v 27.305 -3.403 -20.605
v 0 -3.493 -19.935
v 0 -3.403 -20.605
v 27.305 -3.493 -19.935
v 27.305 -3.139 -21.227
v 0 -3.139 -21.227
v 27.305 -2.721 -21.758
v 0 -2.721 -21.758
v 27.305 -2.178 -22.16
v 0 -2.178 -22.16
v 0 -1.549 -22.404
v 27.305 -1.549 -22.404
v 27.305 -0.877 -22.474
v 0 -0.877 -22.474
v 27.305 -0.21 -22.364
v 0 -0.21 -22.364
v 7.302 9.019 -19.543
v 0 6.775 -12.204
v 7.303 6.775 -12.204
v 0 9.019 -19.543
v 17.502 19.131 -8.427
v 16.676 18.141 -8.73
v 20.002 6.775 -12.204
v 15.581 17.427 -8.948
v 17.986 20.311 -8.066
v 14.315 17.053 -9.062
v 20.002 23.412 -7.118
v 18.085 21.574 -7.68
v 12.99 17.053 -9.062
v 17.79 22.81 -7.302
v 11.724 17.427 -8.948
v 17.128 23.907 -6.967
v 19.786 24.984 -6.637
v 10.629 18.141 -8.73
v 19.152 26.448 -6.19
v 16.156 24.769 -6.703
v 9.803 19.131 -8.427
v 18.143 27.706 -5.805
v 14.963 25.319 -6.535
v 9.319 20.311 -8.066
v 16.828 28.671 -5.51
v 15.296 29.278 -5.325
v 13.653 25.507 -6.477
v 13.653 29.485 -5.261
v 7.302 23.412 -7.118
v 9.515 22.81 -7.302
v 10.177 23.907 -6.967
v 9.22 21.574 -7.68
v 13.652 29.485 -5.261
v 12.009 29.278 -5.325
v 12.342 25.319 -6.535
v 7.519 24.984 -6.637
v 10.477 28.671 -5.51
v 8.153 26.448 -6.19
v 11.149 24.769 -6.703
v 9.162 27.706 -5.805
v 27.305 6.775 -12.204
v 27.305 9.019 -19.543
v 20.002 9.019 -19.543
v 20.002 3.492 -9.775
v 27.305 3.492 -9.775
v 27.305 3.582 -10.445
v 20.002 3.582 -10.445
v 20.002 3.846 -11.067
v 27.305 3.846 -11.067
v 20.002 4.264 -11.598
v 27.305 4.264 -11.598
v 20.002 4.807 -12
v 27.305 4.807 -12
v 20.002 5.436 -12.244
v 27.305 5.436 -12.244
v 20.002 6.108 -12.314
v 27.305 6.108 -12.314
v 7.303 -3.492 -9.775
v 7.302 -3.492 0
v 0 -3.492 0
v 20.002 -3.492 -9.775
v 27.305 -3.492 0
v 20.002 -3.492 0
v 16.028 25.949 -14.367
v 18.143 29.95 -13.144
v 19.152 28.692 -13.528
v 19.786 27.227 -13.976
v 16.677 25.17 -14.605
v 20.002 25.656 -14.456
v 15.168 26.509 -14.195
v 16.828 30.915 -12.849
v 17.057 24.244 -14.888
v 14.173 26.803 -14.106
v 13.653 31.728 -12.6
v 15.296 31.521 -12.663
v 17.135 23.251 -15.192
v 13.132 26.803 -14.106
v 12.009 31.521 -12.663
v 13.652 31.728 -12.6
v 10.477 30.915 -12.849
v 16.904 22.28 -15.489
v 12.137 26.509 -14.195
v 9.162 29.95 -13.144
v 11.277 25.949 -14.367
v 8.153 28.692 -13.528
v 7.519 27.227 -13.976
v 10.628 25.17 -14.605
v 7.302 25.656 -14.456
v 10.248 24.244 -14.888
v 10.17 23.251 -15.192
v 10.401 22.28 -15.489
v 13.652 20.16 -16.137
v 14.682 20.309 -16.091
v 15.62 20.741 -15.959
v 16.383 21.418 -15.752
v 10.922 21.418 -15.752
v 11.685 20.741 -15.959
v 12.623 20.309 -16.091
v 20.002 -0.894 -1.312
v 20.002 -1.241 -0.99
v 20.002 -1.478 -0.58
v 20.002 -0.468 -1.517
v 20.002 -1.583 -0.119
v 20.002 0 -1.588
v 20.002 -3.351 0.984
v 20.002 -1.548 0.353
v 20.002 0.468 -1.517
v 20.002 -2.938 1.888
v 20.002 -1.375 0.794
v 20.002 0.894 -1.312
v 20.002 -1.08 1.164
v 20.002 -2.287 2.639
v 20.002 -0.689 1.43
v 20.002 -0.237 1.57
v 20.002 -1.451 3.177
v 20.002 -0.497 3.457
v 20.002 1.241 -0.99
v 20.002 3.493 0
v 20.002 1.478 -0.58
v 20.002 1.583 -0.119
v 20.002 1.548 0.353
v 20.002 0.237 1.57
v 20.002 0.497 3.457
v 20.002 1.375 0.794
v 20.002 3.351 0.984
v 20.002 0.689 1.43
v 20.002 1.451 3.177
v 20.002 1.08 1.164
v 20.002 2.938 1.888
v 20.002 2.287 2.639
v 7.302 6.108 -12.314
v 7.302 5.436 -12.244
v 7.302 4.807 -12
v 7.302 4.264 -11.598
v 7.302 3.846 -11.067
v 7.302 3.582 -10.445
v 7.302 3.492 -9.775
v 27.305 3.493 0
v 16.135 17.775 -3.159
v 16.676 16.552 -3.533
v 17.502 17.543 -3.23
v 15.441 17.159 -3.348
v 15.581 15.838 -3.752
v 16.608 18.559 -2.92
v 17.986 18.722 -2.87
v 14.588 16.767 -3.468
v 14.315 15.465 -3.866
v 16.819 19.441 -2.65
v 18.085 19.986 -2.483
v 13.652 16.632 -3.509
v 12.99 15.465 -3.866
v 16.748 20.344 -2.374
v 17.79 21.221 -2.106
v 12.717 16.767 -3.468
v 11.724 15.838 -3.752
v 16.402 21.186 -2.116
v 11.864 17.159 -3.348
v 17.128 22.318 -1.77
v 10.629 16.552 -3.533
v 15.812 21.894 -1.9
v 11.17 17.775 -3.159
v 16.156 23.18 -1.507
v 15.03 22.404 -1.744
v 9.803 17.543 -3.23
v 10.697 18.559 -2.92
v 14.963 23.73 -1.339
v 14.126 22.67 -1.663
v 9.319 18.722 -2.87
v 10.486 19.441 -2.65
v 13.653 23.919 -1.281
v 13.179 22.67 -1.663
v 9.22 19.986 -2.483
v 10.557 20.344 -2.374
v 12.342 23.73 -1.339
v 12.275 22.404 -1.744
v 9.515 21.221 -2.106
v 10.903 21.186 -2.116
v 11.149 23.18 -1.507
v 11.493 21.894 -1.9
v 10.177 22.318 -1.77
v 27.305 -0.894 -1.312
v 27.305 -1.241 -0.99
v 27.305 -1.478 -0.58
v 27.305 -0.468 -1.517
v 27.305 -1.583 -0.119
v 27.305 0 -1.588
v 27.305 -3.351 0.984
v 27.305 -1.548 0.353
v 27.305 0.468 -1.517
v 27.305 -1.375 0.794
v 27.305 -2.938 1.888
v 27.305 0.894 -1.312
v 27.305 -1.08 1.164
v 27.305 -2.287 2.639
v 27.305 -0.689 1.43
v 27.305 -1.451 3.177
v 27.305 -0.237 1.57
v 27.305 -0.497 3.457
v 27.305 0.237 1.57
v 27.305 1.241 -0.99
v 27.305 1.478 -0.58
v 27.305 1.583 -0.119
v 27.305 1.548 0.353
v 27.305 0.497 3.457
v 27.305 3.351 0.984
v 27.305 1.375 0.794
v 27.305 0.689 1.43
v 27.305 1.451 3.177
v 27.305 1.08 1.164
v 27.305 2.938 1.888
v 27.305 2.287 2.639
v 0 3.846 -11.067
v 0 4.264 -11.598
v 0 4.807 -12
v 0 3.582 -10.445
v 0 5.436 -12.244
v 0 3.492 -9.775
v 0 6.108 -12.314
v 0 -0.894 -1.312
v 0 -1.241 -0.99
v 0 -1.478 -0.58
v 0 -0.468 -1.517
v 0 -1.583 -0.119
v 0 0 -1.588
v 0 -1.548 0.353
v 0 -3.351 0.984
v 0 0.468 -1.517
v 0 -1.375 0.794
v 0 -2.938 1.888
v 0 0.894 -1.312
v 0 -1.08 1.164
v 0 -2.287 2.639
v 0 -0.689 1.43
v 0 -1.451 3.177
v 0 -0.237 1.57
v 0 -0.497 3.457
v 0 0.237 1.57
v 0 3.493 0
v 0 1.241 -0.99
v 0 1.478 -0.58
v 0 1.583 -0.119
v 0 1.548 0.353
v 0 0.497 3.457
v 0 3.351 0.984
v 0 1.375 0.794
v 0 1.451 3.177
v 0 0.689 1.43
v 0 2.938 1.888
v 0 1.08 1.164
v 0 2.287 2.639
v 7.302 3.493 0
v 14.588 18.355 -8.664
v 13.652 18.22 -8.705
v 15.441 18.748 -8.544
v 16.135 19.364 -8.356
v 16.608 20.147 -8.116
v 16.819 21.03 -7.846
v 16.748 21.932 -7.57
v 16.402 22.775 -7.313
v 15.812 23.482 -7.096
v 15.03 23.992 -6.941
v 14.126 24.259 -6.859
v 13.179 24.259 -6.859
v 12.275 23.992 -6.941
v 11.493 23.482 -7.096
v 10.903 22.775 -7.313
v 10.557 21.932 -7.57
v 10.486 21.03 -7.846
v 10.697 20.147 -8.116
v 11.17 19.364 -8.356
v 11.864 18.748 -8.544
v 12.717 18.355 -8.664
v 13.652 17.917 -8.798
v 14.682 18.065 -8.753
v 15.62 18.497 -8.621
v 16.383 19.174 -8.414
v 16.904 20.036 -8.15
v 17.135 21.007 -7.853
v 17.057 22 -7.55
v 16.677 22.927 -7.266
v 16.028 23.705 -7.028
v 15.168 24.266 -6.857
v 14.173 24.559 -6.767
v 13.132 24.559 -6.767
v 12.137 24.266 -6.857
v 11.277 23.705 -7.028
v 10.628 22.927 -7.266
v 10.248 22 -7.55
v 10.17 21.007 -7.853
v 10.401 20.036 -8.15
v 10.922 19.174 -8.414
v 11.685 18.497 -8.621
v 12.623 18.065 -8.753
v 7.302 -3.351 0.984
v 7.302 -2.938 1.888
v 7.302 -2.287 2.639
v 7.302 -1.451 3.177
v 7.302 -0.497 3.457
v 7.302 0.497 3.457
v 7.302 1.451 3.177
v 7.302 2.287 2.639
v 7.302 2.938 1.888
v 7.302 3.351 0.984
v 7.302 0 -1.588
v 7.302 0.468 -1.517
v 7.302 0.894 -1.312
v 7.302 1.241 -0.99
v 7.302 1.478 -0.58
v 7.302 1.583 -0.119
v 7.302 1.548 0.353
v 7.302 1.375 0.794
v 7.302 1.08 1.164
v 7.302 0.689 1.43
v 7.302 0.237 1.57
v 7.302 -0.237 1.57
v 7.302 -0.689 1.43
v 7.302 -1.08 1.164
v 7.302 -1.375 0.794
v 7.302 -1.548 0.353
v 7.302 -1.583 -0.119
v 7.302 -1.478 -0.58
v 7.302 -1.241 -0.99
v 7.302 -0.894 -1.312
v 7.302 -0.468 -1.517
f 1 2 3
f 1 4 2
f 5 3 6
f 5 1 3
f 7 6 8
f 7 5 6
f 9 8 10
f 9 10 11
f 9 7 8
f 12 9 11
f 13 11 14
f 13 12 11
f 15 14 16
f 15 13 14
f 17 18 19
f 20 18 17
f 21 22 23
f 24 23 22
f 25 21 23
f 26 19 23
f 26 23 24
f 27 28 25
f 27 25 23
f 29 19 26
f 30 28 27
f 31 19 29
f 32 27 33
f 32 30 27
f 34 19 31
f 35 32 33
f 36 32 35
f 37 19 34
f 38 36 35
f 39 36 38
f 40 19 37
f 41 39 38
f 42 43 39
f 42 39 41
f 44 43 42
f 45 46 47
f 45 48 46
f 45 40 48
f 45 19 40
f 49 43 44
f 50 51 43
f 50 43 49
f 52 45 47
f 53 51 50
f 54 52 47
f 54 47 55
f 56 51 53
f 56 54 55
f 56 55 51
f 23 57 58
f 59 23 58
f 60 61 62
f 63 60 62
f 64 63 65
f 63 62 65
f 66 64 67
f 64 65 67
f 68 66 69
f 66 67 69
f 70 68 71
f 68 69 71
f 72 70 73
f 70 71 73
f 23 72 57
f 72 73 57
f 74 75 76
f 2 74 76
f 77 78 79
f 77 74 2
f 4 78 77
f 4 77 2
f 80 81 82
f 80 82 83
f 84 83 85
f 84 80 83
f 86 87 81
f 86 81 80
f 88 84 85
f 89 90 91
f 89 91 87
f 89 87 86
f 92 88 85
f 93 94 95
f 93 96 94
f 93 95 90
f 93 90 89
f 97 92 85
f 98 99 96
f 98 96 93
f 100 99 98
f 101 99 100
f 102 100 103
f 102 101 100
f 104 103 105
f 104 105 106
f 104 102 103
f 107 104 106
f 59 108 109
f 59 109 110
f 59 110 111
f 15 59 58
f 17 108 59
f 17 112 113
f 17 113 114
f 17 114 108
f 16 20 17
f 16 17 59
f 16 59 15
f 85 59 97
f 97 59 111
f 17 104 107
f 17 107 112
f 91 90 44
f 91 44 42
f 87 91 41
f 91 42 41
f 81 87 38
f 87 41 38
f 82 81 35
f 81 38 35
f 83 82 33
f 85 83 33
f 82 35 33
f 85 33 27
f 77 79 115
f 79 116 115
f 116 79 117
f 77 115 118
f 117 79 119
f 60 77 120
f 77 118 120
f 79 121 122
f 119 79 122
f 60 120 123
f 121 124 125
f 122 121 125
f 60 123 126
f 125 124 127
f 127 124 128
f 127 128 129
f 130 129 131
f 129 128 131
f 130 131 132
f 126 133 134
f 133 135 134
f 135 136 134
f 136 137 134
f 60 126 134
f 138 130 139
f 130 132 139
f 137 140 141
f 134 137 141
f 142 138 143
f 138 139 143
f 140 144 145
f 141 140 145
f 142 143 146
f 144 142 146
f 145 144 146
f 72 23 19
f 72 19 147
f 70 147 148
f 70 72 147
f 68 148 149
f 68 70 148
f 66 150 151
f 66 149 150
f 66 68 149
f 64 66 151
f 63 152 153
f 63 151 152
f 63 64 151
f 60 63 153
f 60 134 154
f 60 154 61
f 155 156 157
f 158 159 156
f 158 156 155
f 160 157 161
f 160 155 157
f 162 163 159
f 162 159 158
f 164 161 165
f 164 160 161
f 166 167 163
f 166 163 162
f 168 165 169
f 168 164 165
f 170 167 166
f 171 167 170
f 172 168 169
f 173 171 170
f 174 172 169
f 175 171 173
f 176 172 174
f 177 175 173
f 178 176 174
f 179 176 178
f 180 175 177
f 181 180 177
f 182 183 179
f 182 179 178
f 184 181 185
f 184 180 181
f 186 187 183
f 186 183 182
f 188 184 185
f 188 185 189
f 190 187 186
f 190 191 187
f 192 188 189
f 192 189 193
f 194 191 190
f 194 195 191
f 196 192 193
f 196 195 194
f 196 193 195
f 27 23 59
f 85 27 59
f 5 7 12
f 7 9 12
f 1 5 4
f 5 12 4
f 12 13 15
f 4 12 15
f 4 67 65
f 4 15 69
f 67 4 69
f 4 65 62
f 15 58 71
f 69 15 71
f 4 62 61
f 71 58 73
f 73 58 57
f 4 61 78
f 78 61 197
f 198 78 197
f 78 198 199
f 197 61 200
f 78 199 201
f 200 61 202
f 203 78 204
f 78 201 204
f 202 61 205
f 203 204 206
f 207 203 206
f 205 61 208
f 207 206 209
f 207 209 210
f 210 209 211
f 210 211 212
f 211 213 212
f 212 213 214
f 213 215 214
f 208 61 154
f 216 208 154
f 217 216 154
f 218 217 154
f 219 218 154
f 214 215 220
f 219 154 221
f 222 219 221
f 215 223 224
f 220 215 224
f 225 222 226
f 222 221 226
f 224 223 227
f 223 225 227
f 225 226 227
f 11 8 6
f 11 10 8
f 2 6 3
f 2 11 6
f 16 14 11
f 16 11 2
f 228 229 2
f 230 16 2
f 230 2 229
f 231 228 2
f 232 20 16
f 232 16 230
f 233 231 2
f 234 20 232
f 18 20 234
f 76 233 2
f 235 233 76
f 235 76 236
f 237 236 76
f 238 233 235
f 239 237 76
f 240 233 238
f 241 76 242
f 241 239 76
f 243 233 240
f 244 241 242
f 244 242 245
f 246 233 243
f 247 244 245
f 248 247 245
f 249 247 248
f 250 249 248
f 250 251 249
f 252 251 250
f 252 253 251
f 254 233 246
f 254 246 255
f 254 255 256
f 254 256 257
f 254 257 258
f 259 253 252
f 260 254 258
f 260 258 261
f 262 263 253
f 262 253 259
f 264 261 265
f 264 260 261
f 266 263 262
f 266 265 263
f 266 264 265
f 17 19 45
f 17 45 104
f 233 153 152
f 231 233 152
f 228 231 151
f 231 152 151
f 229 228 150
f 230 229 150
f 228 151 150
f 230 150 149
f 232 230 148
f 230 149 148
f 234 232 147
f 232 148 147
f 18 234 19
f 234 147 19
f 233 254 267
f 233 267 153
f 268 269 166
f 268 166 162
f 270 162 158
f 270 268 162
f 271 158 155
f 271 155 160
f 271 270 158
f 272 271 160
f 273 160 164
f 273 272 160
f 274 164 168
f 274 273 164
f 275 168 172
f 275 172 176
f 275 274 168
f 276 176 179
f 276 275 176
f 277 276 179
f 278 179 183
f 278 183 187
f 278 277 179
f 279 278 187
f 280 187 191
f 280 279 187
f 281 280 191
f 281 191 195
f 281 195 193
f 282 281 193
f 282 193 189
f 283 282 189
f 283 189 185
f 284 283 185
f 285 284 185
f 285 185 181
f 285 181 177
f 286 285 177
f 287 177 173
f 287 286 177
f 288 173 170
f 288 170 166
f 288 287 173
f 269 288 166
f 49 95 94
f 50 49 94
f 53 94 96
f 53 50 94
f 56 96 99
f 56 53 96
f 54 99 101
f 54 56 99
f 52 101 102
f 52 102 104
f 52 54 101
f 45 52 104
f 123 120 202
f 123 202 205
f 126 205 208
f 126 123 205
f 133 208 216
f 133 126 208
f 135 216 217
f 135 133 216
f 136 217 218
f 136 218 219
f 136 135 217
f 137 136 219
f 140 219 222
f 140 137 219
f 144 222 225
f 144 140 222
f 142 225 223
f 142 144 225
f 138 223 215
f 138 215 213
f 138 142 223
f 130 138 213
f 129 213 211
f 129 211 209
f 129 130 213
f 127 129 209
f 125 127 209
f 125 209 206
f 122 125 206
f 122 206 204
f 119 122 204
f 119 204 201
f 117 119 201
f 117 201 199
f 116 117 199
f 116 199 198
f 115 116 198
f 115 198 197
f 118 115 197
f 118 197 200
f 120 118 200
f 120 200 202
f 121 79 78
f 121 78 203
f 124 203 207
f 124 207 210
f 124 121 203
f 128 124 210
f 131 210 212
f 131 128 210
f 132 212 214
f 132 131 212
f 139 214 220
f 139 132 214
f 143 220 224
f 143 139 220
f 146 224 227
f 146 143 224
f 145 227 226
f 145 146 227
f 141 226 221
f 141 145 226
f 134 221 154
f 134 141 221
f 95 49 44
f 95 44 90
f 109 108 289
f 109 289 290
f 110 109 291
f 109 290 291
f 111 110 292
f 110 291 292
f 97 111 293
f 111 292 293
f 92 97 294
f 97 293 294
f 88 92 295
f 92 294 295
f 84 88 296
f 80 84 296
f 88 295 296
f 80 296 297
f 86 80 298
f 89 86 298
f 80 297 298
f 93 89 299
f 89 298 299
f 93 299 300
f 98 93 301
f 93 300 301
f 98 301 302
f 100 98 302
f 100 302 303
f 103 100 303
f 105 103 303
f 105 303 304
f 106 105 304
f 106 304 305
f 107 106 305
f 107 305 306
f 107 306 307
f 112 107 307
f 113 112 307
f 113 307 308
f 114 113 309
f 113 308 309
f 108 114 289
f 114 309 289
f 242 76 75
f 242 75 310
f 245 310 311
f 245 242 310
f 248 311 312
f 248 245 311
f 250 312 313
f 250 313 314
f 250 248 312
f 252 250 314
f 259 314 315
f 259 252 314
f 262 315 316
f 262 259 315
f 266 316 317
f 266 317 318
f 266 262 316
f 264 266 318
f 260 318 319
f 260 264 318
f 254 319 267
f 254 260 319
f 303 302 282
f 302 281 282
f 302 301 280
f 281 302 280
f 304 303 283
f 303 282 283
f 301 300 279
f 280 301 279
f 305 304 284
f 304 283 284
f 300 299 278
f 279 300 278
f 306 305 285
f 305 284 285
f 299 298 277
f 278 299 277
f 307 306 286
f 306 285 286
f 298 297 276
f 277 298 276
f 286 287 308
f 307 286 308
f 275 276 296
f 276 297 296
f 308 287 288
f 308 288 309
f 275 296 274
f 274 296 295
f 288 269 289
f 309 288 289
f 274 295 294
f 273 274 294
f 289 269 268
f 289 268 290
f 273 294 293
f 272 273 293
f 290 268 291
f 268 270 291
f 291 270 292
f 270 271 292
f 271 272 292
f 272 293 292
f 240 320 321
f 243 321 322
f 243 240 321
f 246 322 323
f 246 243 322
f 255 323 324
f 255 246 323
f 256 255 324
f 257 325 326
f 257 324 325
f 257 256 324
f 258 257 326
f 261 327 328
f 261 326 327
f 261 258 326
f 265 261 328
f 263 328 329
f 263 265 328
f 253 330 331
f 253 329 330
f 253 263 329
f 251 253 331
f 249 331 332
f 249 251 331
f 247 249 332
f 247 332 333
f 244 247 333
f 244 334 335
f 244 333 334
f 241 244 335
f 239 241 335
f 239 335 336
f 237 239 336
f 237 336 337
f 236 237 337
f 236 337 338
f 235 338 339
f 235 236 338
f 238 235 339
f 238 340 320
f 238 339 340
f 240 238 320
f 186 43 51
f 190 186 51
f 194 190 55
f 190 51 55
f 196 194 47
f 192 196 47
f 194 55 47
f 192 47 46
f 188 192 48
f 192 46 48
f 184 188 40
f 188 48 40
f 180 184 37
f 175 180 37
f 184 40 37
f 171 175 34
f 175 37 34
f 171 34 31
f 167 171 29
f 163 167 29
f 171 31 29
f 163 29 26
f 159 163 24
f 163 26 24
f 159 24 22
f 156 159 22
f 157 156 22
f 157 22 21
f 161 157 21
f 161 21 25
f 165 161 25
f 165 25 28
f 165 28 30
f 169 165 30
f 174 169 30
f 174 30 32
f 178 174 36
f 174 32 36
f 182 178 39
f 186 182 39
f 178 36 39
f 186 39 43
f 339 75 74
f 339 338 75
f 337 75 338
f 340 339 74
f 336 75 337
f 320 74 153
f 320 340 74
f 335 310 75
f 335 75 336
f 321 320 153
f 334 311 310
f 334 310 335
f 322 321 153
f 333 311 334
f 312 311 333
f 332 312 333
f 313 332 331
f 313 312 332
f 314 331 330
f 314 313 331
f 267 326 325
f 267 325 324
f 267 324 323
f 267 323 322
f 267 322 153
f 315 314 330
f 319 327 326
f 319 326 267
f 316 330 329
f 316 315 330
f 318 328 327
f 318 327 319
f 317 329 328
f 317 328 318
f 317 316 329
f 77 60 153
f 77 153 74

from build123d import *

# Parameters (mm, degrees)
SKETCH1_R                      = 1.5875
BOSS_EXTRUDE1_DEPTH            = 27.305
FILLET1_R                      = 2.54
CUT_EXTRUDE1_REACH             = 49.512
SKETCH2_W                      = 12.7
SKETCH2_H                      = 10.26762413
CUT_EXTRUDE1_DIRECTION_2_DEPTH = 48.511945714
SKETCH3_R                      = 4.445
SKETCH3_R_2                    = 3.175
BOSS_EXTRUDE2_DEPTH            = 5.43375
SKETCH4_R                      = 3.4925
CUT_EXTRUDE2_DEPTH             = 7.673839963
CUT_EXTRUDE3_DEPTH             = 7.3025
CUT_EXTRUDE4_DEPTH             = 7.3025
BOSS_EXTRUDE3_DEPTH            = 12.7
FILLET2_R                      = 6.35


with BuildPart() as part:
    # Sketch1 → Boss-Extrude1 (new body)
    with BuildSketch(Plane(origin=(0, 0, 0), x_dir=(0, 0, -1), z_dir=(1, 0, 0))):
        with BuildLine():
            Line((0, 3.4925), (13.208, 3.4925))
            Line((13.208, 3.4925), (5.261420462, 29.48459049))
            Line((5.261420462, 29.48459049), (12.599950115, 31.728204162))
            Line((12.599950115, 31.728204162), (23.368, -3.4925))
            Line((23.368, -3.4925), (0, -3.4925))
            ThreePointArc((0, -3.4925), (-3.4925, 0), (0, 3.4925))
        make_face()
        Circle(SKETCH1_R, mode=Mode.SUBTRACT)
    extrude(amount=BOSS_EXTRUDE1_DEPTH)

    # Fillet1
    fillet1_edges = [part.edges().sort_by_distance(p)[0] for p in [
        (13.6525, 3.4925, -13.208),
        (13.6525, -3.4925, -23.368),
    ]]
    fillet(fillet1_edges, radius=FILLET1_R)

    # Cut-Extrude1: up to this plane
    cut_extrude1_end = Plane(origin=(27.305, 3.4925, -13.208), z_dir=(0, 0.292371704722731, -0.9563047559630373))
    # Sketch2 → Cut-Extrude1 (cut, up to the surface)
    with BuildSketch(Plane.XY, mode=Mode.PRIVATE) as cut_extrude1_sk1:
        with Locations((13.6525, 1.641312065)):
            Rectangle(SKETCH2_W, SKETCH2_H)
    cut_extrude1_tool1 = split(extrude(cut_extrude1_sk1.sketch, amount=-CUT_EXTRUDE1_REACH, mode=Mode.PRIVATE), bisect_by=cut_extrude1_end, keep=Keep.BOTH, mode=Mode.PRIVATE)
    add(cut_extrude1_tool1.solids().sort_by_distance((13.6525, 1.641312, 0))[0], mode=Mode.SUBTRACT)

    # Sketch2 → Cut-Extrude1 direction 2 (cut)
    with BuildSketch(Plane.XY):
        with Locations((13.6525, 1.641312065)):
            Rectangle(SKETCH2_W, SKETCH2_H)
    extrude(amount=CUT_EXTRUDE1_DIRECTION_2_DEPTH, mode=Mode.SUBTRACT)

    # Sketch3 → Boss-Extrude2 (add)
    with BuildSketch(Plane(origin=(0, 3.991453073, -13.055454737), x_dir=(1, 0, 0), z_dir=(0, -0.2923717047227311, 0.9563047559630372))):
        with Locations(Location((13.6525, 18.054125632, 0), (0, 0, 90))):
            Circle(SKETCH3_R)
        with Locations(Location((13.6525, 18.054125632, 0), (0, 0, 270))):
            Circle(SKETCH3_R_2, mode=Mode.SUBTRACT)
    extrude(amount=BOSS_EXTRUDE2_DEPTH)

    # Sketch4 → Cut-Extrude2 (cut)
    with BuildSketch(Plane(origin=(0, 3.991453073, -13.055454737), x_dir=(1, 0, 0), z_dir=(0, -0.29237170472273094, 0.9563047559630372))):
        with Locations(Location((13.6525, 18.054125632, 0), (0, 0, 270))):
            Circle(SKETCH4_R)
    extrude(amount=-CUT_EXTRUDE2_DEPTH, mode=Mode.SUBTRACT)

    # Sketch5 → Cut-Extrude3 (cut)
    with BuildSketch(Plane.ZY):
        Polygon((-12.599950115, 31.728204162), (-5.261420462, 29.48459049), (-12.204401088, 6.77512413), (-19.542930741, 9.018737802), align=None)
    extrude(amount=-CUT_EXTRUDE3_DEPTH, mode=Mode.SUBTRACT)

    # Sketch6 → Cut-Extrude4 (cut)
    with BuildSketch(Plane(origin=(27.305, 0, 0), x_dir=(0, 0, -1), z_dir=(1, 0, 0))):
        Polygon((12.599950115, 31.728204162), (5.261420462, 29.48459049), (12.204401088, 6.77512413), (19.542930741, 9.018737802), align=None)
    extrude(amount=-CUT_EXTRUDE4_DEPTH, mode=Mode.SUBTRACT)

    # Sketch7 → Boss-Extrude3 (add)
    with BuildSketch(Plane.ZY.offset(-20.0025)):
        with BuildLine():
            Line((-9.775387008, 3.4925), (-9.775387008, -3.4925))
            Line((-9.775387008, -3.4925), (-15.34352881, -3.4925))
            Line((-15.34352881, -3.4925), (-12.204401088, 6.77512413))
            ThreePointArc((-12.204401088, 6.77512413), (-11.817183434, 4.521650122), (-9.775387008, 3.4925))
        make_face()
    extrude(amount=BOSS_EXTRUDE3_DEPTH)

    # Fillet2
    fillet2_edges = [part.edges().sort_by_distance(p)[0] for p in [
        (20.0025, 30.606397326, -8.930685288),
        (7.3025, 30.606397326, -8.930685288),
    ]]
    fillet(fillet2_edges, radius=FILLET2_R - 0.0001)  # a hair under: the kernel refuses the full size


solid = part.part
